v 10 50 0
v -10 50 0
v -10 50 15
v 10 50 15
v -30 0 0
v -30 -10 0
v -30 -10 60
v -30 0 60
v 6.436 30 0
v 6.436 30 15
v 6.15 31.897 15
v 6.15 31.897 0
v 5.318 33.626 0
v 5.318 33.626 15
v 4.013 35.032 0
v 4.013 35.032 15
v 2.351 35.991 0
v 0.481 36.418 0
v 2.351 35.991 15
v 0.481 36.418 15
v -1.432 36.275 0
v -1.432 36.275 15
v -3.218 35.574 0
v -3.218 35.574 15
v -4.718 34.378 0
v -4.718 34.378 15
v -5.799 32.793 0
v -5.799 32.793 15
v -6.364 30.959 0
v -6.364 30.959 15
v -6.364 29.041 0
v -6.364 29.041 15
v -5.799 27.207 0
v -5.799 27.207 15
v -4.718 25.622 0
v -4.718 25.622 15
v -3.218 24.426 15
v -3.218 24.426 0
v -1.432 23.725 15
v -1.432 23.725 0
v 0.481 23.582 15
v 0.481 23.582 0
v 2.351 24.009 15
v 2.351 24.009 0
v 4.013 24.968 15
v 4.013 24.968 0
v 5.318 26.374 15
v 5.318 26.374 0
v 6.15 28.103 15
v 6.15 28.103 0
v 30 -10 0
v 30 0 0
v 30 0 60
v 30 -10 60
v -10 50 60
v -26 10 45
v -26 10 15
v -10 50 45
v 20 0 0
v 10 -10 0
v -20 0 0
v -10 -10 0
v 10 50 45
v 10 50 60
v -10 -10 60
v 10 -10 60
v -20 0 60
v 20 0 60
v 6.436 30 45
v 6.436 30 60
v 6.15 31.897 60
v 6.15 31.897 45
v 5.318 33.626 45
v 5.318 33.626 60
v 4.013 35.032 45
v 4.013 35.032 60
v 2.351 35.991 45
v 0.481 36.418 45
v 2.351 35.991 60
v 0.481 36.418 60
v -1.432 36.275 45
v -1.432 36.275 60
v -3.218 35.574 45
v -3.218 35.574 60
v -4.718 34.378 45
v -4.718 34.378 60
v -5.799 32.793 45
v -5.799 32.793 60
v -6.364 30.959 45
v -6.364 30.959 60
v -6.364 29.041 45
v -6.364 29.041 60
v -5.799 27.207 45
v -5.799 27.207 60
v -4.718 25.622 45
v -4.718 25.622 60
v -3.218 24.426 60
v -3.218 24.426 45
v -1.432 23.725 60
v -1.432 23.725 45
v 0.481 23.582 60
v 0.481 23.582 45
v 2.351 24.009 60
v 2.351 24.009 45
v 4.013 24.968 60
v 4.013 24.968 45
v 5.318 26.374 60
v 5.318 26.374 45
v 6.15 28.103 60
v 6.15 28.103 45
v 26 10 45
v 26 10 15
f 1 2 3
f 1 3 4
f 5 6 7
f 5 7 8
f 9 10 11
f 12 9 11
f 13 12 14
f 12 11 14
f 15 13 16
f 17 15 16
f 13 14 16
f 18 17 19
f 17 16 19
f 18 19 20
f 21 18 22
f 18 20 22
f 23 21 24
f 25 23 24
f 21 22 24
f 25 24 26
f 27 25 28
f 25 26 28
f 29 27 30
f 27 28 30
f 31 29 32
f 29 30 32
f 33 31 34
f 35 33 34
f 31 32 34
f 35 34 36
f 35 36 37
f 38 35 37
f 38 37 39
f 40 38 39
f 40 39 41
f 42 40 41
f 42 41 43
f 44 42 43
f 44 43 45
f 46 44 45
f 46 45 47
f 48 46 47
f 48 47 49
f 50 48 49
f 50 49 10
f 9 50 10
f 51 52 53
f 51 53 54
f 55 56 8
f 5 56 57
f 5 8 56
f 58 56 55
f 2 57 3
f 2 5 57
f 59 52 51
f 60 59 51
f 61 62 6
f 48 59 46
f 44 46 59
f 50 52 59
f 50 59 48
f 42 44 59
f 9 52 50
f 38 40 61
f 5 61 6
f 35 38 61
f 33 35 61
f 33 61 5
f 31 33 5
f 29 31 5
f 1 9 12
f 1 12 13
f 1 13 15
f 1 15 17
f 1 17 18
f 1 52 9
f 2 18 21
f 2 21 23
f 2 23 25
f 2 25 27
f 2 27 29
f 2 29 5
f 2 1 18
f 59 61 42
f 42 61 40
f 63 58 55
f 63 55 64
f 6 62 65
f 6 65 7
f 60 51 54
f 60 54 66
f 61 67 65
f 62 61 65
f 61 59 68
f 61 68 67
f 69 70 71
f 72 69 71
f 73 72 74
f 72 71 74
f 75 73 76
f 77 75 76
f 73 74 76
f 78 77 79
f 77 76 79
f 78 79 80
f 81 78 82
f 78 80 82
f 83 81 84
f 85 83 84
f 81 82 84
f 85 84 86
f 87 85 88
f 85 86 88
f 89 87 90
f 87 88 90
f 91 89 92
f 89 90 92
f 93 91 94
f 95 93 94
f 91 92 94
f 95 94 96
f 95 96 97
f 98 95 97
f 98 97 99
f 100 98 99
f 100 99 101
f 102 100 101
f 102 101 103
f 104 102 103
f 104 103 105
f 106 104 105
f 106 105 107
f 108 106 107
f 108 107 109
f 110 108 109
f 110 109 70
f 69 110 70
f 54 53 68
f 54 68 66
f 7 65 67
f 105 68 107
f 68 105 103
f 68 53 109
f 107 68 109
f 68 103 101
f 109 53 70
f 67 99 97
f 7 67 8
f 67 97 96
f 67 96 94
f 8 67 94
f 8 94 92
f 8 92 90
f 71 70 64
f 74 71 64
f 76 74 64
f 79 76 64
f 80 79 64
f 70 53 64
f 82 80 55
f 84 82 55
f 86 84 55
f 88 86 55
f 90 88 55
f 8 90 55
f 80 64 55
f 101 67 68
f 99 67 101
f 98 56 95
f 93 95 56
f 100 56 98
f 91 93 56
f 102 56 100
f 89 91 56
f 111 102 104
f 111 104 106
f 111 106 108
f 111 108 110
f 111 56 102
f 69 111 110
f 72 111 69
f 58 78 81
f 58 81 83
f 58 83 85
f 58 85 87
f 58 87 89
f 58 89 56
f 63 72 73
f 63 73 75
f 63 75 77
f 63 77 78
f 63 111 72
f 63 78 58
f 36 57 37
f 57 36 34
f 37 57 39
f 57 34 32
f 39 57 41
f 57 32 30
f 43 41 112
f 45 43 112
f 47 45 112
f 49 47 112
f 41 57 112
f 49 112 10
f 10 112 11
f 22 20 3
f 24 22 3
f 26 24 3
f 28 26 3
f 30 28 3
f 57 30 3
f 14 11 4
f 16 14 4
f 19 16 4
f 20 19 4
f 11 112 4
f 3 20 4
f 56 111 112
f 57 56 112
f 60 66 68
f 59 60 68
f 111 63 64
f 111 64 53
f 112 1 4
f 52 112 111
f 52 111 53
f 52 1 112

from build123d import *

# Parameters (mm, degrees)
BOSS_EXTRUDE1_DEPTH = 60
SKETCH3_R           = 6.436223385
CUT_EXTRUDE1_DEPTH  = 61
SKETCH9_W           = 30
SKETCH9_H           = 40
CUT_EXTRUDE3_DEPTH  = 61


with BuildPart() as part:
    # Sketch2 → Boss-Extrude1 (new body)
    with BuildSketch(Plane.XY):
        Polygon((-30, -10), (-30, 0), (-10, 50), (10, 50), (30, 0), (30, -10), (10, -10), (20, 0), (-20, 0), (-10, -10), align=None)
    extrude(amount=BOSS_EXTRUDE1_DEPTH)

    # Sketch3 → Cut-Extrude1 (cut, through all)
    with BuildSketch(Plane.XY.offset(60)):
        with Locations((0, 30)):
            Circle(SKETCH3_R)
    extrude(amount=-CUT_EXTRUDE1_DEPTH, mode=Mode.SUBTRACT)

    # Sketch9 → Cut-Extrude3 (cut, through all)
    with BuildSketch(Plane(origin=(30, 0, 0), x_dir=(0, 0, -1), z_dir=(1, 0, 0))):
        with Locations((-30, 30)):
            Rectangle(SKETCH9_W, SKETCH9_H)
    extrude(amount=-CUT_EXTRUDE3_DEPTH, mode=Mode.SUBTRACT)


solid = part.part
